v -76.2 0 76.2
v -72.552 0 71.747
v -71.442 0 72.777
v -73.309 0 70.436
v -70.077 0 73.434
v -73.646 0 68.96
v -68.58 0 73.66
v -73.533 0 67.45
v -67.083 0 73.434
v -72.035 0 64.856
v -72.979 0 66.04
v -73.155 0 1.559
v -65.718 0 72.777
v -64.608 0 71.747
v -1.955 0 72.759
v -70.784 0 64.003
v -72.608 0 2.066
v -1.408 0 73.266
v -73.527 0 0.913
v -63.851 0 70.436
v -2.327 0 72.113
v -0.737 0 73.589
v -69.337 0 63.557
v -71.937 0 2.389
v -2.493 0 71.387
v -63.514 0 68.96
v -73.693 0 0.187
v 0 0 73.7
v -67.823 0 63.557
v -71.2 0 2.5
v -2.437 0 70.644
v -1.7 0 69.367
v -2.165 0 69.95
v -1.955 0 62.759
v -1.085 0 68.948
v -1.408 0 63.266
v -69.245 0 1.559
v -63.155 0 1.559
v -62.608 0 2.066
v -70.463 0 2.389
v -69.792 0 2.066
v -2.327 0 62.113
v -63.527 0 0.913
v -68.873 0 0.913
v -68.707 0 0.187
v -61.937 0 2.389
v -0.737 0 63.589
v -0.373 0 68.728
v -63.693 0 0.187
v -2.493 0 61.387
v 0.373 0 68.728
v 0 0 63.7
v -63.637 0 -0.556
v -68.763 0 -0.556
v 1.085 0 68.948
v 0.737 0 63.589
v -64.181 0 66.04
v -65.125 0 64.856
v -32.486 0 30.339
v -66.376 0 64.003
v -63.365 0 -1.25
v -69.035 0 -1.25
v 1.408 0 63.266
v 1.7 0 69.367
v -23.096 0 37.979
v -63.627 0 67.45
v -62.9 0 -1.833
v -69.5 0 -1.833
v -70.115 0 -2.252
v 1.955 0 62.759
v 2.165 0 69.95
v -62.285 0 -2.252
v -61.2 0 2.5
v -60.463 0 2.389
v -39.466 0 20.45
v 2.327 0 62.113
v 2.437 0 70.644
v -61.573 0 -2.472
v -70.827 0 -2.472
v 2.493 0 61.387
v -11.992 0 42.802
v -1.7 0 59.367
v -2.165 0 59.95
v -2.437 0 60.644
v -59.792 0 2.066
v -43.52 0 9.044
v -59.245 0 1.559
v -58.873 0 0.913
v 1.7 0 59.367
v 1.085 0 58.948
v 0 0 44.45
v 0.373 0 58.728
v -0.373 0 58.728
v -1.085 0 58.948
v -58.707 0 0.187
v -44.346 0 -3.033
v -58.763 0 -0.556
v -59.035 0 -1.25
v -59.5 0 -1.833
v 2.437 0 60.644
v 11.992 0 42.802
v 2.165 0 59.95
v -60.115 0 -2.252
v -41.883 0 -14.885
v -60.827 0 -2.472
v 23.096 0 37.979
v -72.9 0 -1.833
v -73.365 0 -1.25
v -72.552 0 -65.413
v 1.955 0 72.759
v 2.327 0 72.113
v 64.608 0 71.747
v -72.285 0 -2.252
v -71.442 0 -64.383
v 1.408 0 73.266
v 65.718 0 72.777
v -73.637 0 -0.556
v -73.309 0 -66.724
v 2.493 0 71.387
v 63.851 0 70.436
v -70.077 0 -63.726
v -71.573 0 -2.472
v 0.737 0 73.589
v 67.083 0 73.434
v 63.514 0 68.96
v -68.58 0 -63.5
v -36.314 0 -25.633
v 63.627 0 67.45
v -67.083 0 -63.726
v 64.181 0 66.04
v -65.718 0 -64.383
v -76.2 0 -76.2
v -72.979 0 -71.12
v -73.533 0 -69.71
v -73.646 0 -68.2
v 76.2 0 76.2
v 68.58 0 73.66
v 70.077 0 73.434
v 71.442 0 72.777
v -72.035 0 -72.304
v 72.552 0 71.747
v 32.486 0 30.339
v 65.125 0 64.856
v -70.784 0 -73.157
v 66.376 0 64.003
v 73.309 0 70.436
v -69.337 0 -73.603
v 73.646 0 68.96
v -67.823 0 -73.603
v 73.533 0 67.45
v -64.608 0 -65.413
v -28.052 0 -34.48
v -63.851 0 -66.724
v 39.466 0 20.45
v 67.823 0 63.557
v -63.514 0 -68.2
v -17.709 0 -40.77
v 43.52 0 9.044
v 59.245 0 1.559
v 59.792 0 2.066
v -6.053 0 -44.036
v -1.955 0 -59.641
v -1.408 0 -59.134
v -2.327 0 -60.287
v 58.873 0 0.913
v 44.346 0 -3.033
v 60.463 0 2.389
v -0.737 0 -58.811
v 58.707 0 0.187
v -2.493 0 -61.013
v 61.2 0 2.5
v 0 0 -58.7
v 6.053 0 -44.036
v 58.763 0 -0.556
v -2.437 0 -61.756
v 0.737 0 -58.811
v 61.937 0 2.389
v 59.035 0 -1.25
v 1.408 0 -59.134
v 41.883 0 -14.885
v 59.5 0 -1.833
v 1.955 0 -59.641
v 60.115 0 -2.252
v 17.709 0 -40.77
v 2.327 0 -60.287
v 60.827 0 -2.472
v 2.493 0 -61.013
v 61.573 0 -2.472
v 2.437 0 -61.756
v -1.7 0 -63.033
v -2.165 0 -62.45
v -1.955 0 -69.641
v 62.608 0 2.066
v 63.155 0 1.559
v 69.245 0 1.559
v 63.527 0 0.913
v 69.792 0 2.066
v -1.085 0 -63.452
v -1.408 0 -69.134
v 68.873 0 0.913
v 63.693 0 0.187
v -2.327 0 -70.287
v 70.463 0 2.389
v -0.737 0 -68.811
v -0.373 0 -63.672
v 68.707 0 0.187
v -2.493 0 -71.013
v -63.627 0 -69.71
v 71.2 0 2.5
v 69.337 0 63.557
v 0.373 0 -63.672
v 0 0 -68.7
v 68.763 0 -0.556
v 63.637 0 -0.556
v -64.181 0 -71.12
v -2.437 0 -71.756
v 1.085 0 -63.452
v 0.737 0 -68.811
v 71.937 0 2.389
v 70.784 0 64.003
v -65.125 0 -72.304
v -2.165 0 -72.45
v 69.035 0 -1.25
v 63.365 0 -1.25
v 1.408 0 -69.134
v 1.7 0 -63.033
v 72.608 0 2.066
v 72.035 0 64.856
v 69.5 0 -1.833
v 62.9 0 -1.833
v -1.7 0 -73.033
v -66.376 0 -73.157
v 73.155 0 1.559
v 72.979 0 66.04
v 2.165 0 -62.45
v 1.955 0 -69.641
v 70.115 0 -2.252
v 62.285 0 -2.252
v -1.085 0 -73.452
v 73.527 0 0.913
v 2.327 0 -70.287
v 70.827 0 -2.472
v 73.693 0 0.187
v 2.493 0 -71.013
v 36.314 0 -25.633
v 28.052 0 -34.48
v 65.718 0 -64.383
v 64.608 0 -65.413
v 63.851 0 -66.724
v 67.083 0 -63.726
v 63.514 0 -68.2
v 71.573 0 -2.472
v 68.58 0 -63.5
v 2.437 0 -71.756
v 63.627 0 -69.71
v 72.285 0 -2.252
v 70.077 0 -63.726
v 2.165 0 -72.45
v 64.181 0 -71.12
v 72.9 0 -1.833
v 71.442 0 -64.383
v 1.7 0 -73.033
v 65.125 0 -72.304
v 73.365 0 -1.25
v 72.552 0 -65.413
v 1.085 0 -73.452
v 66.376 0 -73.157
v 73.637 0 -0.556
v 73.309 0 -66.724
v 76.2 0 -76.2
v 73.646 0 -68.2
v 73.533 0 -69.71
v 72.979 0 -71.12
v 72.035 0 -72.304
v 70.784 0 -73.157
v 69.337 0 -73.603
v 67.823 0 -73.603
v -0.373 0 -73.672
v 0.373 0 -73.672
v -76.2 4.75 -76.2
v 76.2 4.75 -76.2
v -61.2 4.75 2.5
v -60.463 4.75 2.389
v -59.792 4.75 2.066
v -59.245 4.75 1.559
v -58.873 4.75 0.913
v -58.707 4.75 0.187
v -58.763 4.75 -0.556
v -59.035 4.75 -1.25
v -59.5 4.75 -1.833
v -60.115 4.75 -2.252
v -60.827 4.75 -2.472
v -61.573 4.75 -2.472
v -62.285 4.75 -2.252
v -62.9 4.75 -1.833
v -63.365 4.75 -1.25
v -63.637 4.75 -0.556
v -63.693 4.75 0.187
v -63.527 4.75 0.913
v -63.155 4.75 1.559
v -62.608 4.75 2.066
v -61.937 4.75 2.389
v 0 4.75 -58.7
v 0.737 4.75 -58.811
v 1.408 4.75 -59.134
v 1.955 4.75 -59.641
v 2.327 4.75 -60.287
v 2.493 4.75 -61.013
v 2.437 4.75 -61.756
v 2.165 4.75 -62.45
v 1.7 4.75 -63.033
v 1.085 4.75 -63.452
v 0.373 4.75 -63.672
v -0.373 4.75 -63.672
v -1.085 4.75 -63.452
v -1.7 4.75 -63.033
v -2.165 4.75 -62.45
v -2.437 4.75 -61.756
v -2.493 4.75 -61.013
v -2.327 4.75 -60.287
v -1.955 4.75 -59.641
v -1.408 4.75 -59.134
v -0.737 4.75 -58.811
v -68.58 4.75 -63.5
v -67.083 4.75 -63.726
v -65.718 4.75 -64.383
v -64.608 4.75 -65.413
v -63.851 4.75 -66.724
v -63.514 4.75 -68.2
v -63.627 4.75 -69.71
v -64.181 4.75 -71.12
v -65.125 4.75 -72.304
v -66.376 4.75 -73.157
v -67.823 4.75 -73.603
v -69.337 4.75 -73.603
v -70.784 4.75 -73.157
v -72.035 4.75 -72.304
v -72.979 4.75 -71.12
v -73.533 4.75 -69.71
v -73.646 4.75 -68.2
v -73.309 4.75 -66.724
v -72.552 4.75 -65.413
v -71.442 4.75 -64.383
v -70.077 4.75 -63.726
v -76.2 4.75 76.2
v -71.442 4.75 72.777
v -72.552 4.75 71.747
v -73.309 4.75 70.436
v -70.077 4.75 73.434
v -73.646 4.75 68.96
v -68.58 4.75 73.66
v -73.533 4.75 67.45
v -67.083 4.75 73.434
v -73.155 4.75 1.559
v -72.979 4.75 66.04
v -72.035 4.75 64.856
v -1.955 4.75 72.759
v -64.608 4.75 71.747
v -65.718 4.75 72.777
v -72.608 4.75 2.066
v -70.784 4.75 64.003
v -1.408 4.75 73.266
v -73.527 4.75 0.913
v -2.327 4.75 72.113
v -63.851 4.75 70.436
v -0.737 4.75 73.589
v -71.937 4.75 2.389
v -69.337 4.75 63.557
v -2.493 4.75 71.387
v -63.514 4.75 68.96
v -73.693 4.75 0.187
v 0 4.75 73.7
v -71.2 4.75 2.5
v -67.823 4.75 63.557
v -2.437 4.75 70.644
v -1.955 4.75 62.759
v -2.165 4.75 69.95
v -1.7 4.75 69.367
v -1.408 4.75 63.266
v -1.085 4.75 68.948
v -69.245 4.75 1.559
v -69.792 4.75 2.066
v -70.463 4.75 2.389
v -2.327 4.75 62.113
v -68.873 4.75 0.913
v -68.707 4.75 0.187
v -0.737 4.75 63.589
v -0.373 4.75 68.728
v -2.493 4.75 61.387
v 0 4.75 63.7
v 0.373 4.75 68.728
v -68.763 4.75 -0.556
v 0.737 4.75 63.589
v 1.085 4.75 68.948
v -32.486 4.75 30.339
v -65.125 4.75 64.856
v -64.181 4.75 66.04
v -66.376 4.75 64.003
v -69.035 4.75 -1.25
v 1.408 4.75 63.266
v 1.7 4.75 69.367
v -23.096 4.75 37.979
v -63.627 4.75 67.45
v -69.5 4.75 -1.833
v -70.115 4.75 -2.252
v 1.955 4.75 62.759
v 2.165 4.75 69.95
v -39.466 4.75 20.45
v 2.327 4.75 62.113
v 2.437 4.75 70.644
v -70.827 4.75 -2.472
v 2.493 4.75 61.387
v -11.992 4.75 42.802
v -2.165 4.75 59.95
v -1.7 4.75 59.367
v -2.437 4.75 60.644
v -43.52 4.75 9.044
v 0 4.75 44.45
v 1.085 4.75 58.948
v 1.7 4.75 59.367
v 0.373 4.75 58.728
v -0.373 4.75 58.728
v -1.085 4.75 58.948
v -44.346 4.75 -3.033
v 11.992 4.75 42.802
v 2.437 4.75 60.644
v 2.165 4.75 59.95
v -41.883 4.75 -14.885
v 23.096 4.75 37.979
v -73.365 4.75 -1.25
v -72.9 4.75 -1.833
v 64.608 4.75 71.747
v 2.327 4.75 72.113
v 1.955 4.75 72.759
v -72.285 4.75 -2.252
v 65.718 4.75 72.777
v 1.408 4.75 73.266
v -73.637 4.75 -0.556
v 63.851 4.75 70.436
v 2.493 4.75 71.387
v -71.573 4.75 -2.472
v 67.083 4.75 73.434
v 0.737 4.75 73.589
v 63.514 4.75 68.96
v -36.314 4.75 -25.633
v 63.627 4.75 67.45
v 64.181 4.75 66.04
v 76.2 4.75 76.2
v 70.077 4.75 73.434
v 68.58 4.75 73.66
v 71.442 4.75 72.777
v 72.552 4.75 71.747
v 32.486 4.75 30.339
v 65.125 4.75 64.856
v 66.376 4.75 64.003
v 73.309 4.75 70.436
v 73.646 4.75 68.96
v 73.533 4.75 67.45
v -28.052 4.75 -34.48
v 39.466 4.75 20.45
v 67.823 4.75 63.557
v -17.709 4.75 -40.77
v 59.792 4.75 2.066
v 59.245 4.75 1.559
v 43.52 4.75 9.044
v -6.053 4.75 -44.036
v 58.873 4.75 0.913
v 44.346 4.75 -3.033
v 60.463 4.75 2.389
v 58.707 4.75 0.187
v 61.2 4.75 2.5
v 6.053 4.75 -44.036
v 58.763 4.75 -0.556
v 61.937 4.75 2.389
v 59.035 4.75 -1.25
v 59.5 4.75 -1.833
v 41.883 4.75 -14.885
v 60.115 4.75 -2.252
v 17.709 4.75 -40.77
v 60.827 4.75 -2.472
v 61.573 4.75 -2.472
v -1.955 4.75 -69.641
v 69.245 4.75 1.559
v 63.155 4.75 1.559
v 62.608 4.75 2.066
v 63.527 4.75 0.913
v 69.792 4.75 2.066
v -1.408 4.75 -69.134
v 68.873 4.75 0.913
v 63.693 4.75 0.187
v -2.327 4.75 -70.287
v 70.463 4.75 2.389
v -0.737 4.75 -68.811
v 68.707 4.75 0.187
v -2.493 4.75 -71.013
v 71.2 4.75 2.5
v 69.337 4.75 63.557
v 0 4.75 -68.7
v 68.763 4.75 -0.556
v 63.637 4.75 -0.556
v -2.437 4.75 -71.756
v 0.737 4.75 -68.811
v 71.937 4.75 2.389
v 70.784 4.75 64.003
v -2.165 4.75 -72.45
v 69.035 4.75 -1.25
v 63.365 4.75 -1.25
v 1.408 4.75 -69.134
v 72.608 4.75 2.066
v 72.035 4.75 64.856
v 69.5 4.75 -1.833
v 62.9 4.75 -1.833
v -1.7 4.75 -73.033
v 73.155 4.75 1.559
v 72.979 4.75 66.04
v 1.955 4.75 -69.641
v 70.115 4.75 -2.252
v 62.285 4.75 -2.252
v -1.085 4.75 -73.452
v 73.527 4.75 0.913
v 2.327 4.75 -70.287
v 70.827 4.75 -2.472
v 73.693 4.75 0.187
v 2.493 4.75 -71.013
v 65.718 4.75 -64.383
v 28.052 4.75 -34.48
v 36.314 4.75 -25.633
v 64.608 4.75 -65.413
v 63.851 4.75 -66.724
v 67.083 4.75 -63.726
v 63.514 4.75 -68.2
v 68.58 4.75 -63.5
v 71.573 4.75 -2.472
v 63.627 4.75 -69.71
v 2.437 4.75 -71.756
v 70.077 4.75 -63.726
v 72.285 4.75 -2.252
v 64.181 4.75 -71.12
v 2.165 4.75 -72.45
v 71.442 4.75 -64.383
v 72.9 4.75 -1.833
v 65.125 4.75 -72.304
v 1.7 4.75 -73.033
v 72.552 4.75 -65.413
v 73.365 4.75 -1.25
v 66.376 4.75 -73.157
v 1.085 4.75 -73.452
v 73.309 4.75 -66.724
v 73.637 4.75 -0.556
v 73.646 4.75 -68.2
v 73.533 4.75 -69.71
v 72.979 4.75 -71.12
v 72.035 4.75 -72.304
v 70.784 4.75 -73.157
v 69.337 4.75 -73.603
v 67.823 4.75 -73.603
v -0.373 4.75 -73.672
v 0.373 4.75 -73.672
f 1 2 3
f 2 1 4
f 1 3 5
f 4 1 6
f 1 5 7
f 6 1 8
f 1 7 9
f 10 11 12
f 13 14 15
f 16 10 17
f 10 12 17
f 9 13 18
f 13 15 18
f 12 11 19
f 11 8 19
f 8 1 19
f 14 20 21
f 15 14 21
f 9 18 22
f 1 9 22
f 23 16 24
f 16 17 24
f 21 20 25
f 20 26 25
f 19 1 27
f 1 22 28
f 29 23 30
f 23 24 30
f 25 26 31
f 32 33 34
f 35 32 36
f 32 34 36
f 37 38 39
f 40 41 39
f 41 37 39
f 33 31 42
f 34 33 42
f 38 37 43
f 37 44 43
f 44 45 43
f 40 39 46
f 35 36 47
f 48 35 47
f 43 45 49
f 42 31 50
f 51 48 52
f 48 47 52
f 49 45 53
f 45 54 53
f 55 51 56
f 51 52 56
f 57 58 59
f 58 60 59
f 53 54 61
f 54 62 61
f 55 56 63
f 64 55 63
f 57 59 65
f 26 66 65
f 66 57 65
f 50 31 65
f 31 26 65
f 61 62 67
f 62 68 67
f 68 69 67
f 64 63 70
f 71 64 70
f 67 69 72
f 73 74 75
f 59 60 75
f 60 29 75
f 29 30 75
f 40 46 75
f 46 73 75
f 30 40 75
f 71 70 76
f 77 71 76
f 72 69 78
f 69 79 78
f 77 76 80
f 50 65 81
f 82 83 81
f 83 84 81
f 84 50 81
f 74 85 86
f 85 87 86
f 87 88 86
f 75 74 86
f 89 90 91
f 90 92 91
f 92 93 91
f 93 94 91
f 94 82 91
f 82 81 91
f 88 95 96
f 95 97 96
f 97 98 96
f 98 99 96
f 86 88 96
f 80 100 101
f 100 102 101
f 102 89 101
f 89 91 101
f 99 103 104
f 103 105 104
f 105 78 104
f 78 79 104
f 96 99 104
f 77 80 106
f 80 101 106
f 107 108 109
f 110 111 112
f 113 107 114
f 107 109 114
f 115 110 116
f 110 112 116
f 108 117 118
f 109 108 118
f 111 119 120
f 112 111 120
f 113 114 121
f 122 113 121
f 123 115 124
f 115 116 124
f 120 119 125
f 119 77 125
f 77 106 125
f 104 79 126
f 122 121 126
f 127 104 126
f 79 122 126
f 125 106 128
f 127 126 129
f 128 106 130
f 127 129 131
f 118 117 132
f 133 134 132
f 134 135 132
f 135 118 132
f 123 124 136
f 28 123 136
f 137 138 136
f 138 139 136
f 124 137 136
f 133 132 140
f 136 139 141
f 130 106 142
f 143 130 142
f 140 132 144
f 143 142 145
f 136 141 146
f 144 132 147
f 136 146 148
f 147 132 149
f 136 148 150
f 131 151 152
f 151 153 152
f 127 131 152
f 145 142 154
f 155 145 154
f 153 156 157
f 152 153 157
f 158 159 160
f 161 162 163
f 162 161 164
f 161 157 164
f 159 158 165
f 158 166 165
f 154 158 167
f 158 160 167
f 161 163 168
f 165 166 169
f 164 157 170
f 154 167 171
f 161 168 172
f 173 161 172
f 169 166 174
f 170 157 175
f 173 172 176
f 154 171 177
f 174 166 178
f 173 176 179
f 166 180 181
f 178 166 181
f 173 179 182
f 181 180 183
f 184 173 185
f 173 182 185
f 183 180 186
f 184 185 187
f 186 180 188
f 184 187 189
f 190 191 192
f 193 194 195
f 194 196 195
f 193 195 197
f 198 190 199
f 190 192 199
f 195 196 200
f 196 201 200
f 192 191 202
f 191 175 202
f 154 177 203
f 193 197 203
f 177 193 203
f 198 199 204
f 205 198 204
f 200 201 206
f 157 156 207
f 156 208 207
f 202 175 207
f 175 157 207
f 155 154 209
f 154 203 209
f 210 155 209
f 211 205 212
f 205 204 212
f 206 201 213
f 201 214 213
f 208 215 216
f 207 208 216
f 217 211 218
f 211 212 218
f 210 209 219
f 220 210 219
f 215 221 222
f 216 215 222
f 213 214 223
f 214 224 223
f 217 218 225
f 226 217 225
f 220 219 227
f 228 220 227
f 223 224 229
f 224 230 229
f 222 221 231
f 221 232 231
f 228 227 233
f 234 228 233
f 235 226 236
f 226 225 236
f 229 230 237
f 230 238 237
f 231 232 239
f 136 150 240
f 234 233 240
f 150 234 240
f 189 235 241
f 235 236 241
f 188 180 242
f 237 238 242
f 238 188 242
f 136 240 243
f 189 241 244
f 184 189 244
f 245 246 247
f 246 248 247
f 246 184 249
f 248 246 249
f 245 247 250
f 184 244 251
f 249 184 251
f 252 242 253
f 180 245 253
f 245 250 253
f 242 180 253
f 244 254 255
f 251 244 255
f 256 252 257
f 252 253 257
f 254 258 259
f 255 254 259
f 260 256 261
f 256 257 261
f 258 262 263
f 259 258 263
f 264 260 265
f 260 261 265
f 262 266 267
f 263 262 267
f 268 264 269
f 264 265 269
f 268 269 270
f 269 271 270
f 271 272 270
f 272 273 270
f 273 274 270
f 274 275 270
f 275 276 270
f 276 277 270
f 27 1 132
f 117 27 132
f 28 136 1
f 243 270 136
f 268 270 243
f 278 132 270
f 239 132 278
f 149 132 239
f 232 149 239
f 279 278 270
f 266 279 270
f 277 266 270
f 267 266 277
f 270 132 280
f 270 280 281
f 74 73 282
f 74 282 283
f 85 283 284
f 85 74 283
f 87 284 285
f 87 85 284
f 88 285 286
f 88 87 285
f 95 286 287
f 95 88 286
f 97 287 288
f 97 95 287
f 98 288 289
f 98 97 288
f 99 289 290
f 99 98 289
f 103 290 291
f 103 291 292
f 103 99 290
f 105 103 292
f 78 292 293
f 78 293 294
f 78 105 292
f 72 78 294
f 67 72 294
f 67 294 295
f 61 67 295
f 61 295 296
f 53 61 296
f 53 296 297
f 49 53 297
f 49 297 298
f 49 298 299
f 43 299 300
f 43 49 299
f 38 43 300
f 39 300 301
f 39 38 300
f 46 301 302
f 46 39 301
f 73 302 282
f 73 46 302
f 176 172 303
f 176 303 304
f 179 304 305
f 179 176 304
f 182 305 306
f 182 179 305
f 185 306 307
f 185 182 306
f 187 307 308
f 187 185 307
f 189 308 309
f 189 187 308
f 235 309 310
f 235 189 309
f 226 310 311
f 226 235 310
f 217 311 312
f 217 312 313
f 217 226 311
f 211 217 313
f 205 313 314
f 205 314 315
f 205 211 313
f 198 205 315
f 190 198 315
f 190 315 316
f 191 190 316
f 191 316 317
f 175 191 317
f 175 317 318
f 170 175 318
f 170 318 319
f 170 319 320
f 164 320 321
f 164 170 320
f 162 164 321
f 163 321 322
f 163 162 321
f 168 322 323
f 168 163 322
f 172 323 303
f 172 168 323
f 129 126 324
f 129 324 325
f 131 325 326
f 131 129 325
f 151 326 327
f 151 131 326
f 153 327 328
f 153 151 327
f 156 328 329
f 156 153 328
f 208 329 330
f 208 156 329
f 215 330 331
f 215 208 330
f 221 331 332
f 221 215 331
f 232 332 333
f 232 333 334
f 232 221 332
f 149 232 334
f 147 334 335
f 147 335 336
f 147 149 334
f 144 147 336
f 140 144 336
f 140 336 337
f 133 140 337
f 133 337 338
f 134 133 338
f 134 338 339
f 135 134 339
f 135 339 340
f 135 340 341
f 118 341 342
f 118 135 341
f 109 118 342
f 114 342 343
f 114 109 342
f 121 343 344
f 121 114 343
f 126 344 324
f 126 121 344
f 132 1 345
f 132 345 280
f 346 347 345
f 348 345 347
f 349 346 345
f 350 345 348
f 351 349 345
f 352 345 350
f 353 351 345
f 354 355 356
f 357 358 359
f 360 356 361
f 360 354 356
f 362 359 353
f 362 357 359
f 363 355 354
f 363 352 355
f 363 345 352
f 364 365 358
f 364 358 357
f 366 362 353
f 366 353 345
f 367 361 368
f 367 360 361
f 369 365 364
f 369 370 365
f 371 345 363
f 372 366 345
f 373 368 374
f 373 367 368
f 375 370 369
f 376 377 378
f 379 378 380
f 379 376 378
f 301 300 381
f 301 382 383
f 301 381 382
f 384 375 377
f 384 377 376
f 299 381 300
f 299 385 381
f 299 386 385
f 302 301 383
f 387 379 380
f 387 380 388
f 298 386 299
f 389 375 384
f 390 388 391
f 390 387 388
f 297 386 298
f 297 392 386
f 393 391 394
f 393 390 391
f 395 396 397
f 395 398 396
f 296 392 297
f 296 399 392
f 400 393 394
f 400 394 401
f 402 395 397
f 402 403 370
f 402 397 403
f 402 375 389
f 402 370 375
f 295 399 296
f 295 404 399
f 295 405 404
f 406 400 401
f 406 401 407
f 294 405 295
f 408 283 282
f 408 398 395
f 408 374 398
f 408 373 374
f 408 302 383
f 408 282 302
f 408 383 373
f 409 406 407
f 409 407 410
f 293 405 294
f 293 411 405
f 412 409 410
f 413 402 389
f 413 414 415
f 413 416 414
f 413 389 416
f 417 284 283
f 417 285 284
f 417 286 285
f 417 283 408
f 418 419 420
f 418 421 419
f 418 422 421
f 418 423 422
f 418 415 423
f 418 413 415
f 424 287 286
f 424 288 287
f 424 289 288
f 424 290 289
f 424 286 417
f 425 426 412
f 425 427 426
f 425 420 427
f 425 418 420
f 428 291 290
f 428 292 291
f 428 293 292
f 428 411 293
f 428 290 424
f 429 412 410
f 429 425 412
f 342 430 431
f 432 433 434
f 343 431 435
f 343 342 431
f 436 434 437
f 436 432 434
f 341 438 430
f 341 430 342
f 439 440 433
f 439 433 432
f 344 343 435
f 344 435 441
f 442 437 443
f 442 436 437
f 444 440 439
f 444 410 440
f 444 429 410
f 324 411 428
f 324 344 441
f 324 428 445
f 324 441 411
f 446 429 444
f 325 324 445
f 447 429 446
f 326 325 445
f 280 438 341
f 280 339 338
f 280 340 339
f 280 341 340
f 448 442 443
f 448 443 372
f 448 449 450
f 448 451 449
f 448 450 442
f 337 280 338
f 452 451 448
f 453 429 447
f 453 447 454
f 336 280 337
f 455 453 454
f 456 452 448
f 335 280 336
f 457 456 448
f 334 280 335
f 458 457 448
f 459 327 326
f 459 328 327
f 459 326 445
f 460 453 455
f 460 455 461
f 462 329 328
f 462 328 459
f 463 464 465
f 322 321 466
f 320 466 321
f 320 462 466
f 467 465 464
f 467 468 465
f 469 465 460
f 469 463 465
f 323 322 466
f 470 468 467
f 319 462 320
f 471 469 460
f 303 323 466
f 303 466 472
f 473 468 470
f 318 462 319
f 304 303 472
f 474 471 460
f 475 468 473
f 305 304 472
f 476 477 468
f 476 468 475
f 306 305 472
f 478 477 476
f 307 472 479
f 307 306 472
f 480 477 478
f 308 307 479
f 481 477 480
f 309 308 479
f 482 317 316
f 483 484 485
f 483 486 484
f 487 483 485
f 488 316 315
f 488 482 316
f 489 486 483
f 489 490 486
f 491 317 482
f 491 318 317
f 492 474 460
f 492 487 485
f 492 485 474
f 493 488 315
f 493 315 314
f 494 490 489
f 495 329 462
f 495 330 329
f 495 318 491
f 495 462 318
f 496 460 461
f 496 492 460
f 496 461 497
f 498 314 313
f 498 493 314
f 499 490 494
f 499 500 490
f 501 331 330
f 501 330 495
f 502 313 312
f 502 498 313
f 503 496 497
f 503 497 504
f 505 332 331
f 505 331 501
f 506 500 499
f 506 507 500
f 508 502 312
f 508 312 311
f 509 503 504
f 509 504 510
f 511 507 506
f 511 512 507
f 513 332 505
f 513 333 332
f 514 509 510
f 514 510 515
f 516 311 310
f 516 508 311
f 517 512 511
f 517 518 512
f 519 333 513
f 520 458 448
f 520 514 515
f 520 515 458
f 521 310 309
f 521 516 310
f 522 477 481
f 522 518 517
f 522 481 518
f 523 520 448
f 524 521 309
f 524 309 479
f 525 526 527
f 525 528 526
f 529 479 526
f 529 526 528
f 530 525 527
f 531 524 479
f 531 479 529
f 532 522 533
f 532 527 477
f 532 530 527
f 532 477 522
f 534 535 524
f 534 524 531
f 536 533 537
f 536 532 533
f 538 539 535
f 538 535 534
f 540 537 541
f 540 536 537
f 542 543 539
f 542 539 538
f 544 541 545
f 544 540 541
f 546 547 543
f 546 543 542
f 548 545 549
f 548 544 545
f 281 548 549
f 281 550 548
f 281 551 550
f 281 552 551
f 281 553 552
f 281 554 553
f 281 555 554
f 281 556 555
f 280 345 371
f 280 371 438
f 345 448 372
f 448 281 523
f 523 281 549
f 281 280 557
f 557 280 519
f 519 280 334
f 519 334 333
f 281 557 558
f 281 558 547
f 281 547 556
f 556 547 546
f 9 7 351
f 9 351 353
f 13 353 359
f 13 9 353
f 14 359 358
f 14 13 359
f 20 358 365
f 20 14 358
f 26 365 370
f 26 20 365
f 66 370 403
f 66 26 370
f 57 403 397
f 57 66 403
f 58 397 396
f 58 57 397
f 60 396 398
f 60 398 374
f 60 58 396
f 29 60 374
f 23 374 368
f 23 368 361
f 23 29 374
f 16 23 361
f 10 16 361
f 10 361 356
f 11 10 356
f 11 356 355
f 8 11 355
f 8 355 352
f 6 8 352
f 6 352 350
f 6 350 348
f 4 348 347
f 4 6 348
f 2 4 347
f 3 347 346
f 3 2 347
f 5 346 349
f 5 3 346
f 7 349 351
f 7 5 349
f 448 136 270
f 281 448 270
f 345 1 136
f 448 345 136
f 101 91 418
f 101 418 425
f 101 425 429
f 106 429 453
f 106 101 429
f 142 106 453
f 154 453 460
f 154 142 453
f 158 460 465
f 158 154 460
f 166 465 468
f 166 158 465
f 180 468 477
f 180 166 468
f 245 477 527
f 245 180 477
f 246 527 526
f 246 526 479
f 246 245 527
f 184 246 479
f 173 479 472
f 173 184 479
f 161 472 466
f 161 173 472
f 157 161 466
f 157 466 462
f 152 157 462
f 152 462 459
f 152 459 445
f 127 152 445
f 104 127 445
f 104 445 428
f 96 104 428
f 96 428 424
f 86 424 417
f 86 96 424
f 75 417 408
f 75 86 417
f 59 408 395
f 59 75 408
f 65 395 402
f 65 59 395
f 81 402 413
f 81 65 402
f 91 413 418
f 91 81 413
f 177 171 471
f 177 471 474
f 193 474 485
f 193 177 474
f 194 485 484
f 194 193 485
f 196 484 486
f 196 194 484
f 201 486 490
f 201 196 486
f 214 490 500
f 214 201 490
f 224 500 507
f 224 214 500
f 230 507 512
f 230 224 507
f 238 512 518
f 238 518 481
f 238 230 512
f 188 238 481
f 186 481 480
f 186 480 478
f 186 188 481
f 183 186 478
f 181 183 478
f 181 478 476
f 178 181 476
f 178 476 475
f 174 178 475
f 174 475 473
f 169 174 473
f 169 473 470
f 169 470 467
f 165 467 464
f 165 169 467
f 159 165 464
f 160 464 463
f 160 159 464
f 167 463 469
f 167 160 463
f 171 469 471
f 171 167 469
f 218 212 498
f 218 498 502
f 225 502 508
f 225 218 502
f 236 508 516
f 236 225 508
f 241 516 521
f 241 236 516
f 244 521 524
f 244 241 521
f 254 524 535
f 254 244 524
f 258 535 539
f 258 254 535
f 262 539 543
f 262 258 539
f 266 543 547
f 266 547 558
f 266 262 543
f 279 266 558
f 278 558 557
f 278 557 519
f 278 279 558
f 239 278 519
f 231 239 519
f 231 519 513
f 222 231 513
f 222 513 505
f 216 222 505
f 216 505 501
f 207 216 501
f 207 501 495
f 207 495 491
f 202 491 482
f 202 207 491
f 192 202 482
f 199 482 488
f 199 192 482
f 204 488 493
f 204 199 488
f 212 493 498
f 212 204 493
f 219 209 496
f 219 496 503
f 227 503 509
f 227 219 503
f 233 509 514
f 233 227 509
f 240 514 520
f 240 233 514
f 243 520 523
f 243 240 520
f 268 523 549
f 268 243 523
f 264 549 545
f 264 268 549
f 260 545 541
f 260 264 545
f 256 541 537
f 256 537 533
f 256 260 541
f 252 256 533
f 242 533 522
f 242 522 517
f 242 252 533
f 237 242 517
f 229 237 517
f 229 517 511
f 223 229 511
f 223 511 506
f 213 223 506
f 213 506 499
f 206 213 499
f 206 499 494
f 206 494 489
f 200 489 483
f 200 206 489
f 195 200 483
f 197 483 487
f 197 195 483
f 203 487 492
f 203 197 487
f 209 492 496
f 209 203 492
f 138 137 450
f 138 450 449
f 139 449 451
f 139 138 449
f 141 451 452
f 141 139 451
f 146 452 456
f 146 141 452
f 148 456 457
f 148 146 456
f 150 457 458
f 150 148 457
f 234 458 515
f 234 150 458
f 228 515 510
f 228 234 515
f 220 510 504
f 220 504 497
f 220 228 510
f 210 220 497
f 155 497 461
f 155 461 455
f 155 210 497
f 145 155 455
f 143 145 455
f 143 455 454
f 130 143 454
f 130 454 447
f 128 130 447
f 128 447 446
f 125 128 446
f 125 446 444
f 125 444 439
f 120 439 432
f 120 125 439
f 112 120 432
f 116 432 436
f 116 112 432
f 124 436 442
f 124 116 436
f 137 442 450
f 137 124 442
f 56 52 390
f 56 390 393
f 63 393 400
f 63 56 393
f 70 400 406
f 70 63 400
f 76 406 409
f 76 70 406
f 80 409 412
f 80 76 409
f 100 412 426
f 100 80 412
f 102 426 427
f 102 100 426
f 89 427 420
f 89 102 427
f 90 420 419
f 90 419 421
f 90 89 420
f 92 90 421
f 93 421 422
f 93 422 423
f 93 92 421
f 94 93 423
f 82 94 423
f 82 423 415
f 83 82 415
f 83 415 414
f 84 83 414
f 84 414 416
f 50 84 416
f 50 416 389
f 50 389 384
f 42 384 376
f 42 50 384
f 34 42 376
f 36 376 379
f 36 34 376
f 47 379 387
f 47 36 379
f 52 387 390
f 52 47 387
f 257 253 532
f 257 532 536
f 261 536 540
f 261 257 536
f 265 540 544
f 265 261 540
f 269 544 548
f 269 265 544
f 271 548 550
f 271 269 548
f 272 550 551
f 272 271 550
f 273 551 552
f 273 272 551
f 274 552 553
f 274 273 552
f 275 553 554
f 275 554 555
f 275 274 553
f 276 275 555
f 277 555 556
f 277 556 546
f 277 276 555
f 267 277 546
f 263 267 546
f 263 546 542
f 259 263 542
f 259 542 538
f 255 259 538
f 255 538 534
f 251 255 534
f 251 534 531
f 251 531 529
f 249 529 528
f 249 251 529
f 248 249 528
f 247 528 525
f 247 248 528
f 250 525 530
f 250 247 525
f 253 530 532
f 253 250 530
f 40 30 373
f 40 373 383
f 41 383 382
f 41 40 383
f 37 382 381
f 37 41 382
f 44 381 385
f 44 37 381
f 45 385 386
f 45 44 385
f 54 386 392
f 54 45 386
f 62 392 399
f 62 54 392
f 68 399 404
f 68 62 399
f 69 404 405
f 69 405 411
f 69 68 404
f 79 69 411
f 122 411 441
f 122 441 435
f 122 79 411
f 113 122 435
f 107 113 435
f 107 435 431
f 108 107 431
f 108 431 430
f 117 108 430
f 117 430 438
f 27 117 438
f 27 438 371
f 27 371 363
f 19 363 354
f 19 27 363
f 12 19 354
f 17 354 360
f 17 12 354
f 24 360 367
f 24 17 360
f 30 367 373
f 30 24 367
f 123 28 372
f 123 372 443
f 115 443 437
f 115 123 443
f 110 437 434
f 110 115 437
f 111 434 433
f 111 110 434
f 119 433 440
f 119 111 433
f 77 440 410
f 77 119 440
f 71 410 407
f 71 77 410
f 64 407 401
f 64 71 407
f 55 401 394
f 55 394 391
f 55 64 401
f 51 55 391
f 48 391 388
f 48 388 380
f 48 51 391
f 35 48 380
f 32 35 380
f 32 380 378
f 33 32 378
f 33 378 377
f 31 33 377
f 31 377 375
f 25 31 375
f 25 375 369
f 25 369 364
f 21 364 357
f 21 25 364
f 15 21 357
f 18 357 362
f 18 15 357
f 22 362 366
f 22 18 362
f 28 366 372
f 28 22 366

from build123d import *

# Parameters (mm, degrees)
SKETCH1_W           = 152.4
SKETCH1_H           = 152.4
SKETCH1_R           = 44.45
SKETCH1_R_2         = 2.5
SKETCH1_R_3         = 5.08
BOSS_EXTRUDE1_DEPTH = 4.7498


with BuildPart() as part:
    # Sketch1 → Boss-Extrude1 (new body)
    with BuildSketch(Plane(origin=(0, 0, 0), x_dir=(1, 0, 0), z_dir=(0, 1, 0))):
        Rectangle(SKETCH1_W, SKETCH1_H)
        with Locations(Location((0, 0, 0), (0, 0, 270))):
            Circle(SKETCH1_R, mode=Mode.SUBTRACT)
        with Locations(Location((0, -71.2, 0), (0, 0, 270))):
            Circle(SKETCH1_R_2, mode=Mode.SUBTRACT)
        with Locations(Location((0, -61.2, 0), (0, 0, 270))):
            Circle(SKETCH1_R_2, mode=Mode.SUBTRACT)
        with Locations(Location((-61.2, 0, 0), (0, 0, 270))):
            Circle(SKETCH1_R_2, mode=Mode.SUBTRACT)
        with Locations(Location((-71.2, 0, 0), (0, 0, 270))):
            Circle(SKETCH1_R_2, mode=Mode.SUBTRACT)
        with Locations(Location((0, 61.2, 0), (0, 0, 270))):
            Circle(SKETCH1_R_2, mode=Mode.SUBTRACT)
        with Locations(Location((0, 71.2, 0), (0, 0, 270))):
            Circle(SKETCH1_R_2, mode=Mode.SUBTRACT)
        with Locations(Location((61.2, 0, 0), (0, 0, 270))):
            Circle(SKETCH1_R_2, mode=Mode.SUBTRACT)
        with Locations(Location((71.2, 0, 0), (0, 0, 270))):
            Circle(SKETCH1_R_2, mode=Mode.SUBTRACT)
        with Locations(Location((-68.58, -68.58, 0), (0, 0, 270))):
            Circle(SKETCH1_R_3, mode=Mode.SUBTRACT)
        with Locations(Location((-68.58, 68.58, 0), (0, 0, 270))):
            Circle(SKETCH1_R_3, mode=Mode.SUBTRACT)
        with Locations(Location((68.58, 68.58, 0), (0, 0, 270))):
            Circle(SKETCH1_R_3, mode=Mode.SUBTRACT)
        with Locations(Location((68.58, -68.58, 0), (0, 0, 270))):
            Circle(SKETCH1_R_3, mode=Mode.SUBTRACT)
    extrude(amount=BOSS_EXTRUDE1_DEPTH)


solid = part.part
